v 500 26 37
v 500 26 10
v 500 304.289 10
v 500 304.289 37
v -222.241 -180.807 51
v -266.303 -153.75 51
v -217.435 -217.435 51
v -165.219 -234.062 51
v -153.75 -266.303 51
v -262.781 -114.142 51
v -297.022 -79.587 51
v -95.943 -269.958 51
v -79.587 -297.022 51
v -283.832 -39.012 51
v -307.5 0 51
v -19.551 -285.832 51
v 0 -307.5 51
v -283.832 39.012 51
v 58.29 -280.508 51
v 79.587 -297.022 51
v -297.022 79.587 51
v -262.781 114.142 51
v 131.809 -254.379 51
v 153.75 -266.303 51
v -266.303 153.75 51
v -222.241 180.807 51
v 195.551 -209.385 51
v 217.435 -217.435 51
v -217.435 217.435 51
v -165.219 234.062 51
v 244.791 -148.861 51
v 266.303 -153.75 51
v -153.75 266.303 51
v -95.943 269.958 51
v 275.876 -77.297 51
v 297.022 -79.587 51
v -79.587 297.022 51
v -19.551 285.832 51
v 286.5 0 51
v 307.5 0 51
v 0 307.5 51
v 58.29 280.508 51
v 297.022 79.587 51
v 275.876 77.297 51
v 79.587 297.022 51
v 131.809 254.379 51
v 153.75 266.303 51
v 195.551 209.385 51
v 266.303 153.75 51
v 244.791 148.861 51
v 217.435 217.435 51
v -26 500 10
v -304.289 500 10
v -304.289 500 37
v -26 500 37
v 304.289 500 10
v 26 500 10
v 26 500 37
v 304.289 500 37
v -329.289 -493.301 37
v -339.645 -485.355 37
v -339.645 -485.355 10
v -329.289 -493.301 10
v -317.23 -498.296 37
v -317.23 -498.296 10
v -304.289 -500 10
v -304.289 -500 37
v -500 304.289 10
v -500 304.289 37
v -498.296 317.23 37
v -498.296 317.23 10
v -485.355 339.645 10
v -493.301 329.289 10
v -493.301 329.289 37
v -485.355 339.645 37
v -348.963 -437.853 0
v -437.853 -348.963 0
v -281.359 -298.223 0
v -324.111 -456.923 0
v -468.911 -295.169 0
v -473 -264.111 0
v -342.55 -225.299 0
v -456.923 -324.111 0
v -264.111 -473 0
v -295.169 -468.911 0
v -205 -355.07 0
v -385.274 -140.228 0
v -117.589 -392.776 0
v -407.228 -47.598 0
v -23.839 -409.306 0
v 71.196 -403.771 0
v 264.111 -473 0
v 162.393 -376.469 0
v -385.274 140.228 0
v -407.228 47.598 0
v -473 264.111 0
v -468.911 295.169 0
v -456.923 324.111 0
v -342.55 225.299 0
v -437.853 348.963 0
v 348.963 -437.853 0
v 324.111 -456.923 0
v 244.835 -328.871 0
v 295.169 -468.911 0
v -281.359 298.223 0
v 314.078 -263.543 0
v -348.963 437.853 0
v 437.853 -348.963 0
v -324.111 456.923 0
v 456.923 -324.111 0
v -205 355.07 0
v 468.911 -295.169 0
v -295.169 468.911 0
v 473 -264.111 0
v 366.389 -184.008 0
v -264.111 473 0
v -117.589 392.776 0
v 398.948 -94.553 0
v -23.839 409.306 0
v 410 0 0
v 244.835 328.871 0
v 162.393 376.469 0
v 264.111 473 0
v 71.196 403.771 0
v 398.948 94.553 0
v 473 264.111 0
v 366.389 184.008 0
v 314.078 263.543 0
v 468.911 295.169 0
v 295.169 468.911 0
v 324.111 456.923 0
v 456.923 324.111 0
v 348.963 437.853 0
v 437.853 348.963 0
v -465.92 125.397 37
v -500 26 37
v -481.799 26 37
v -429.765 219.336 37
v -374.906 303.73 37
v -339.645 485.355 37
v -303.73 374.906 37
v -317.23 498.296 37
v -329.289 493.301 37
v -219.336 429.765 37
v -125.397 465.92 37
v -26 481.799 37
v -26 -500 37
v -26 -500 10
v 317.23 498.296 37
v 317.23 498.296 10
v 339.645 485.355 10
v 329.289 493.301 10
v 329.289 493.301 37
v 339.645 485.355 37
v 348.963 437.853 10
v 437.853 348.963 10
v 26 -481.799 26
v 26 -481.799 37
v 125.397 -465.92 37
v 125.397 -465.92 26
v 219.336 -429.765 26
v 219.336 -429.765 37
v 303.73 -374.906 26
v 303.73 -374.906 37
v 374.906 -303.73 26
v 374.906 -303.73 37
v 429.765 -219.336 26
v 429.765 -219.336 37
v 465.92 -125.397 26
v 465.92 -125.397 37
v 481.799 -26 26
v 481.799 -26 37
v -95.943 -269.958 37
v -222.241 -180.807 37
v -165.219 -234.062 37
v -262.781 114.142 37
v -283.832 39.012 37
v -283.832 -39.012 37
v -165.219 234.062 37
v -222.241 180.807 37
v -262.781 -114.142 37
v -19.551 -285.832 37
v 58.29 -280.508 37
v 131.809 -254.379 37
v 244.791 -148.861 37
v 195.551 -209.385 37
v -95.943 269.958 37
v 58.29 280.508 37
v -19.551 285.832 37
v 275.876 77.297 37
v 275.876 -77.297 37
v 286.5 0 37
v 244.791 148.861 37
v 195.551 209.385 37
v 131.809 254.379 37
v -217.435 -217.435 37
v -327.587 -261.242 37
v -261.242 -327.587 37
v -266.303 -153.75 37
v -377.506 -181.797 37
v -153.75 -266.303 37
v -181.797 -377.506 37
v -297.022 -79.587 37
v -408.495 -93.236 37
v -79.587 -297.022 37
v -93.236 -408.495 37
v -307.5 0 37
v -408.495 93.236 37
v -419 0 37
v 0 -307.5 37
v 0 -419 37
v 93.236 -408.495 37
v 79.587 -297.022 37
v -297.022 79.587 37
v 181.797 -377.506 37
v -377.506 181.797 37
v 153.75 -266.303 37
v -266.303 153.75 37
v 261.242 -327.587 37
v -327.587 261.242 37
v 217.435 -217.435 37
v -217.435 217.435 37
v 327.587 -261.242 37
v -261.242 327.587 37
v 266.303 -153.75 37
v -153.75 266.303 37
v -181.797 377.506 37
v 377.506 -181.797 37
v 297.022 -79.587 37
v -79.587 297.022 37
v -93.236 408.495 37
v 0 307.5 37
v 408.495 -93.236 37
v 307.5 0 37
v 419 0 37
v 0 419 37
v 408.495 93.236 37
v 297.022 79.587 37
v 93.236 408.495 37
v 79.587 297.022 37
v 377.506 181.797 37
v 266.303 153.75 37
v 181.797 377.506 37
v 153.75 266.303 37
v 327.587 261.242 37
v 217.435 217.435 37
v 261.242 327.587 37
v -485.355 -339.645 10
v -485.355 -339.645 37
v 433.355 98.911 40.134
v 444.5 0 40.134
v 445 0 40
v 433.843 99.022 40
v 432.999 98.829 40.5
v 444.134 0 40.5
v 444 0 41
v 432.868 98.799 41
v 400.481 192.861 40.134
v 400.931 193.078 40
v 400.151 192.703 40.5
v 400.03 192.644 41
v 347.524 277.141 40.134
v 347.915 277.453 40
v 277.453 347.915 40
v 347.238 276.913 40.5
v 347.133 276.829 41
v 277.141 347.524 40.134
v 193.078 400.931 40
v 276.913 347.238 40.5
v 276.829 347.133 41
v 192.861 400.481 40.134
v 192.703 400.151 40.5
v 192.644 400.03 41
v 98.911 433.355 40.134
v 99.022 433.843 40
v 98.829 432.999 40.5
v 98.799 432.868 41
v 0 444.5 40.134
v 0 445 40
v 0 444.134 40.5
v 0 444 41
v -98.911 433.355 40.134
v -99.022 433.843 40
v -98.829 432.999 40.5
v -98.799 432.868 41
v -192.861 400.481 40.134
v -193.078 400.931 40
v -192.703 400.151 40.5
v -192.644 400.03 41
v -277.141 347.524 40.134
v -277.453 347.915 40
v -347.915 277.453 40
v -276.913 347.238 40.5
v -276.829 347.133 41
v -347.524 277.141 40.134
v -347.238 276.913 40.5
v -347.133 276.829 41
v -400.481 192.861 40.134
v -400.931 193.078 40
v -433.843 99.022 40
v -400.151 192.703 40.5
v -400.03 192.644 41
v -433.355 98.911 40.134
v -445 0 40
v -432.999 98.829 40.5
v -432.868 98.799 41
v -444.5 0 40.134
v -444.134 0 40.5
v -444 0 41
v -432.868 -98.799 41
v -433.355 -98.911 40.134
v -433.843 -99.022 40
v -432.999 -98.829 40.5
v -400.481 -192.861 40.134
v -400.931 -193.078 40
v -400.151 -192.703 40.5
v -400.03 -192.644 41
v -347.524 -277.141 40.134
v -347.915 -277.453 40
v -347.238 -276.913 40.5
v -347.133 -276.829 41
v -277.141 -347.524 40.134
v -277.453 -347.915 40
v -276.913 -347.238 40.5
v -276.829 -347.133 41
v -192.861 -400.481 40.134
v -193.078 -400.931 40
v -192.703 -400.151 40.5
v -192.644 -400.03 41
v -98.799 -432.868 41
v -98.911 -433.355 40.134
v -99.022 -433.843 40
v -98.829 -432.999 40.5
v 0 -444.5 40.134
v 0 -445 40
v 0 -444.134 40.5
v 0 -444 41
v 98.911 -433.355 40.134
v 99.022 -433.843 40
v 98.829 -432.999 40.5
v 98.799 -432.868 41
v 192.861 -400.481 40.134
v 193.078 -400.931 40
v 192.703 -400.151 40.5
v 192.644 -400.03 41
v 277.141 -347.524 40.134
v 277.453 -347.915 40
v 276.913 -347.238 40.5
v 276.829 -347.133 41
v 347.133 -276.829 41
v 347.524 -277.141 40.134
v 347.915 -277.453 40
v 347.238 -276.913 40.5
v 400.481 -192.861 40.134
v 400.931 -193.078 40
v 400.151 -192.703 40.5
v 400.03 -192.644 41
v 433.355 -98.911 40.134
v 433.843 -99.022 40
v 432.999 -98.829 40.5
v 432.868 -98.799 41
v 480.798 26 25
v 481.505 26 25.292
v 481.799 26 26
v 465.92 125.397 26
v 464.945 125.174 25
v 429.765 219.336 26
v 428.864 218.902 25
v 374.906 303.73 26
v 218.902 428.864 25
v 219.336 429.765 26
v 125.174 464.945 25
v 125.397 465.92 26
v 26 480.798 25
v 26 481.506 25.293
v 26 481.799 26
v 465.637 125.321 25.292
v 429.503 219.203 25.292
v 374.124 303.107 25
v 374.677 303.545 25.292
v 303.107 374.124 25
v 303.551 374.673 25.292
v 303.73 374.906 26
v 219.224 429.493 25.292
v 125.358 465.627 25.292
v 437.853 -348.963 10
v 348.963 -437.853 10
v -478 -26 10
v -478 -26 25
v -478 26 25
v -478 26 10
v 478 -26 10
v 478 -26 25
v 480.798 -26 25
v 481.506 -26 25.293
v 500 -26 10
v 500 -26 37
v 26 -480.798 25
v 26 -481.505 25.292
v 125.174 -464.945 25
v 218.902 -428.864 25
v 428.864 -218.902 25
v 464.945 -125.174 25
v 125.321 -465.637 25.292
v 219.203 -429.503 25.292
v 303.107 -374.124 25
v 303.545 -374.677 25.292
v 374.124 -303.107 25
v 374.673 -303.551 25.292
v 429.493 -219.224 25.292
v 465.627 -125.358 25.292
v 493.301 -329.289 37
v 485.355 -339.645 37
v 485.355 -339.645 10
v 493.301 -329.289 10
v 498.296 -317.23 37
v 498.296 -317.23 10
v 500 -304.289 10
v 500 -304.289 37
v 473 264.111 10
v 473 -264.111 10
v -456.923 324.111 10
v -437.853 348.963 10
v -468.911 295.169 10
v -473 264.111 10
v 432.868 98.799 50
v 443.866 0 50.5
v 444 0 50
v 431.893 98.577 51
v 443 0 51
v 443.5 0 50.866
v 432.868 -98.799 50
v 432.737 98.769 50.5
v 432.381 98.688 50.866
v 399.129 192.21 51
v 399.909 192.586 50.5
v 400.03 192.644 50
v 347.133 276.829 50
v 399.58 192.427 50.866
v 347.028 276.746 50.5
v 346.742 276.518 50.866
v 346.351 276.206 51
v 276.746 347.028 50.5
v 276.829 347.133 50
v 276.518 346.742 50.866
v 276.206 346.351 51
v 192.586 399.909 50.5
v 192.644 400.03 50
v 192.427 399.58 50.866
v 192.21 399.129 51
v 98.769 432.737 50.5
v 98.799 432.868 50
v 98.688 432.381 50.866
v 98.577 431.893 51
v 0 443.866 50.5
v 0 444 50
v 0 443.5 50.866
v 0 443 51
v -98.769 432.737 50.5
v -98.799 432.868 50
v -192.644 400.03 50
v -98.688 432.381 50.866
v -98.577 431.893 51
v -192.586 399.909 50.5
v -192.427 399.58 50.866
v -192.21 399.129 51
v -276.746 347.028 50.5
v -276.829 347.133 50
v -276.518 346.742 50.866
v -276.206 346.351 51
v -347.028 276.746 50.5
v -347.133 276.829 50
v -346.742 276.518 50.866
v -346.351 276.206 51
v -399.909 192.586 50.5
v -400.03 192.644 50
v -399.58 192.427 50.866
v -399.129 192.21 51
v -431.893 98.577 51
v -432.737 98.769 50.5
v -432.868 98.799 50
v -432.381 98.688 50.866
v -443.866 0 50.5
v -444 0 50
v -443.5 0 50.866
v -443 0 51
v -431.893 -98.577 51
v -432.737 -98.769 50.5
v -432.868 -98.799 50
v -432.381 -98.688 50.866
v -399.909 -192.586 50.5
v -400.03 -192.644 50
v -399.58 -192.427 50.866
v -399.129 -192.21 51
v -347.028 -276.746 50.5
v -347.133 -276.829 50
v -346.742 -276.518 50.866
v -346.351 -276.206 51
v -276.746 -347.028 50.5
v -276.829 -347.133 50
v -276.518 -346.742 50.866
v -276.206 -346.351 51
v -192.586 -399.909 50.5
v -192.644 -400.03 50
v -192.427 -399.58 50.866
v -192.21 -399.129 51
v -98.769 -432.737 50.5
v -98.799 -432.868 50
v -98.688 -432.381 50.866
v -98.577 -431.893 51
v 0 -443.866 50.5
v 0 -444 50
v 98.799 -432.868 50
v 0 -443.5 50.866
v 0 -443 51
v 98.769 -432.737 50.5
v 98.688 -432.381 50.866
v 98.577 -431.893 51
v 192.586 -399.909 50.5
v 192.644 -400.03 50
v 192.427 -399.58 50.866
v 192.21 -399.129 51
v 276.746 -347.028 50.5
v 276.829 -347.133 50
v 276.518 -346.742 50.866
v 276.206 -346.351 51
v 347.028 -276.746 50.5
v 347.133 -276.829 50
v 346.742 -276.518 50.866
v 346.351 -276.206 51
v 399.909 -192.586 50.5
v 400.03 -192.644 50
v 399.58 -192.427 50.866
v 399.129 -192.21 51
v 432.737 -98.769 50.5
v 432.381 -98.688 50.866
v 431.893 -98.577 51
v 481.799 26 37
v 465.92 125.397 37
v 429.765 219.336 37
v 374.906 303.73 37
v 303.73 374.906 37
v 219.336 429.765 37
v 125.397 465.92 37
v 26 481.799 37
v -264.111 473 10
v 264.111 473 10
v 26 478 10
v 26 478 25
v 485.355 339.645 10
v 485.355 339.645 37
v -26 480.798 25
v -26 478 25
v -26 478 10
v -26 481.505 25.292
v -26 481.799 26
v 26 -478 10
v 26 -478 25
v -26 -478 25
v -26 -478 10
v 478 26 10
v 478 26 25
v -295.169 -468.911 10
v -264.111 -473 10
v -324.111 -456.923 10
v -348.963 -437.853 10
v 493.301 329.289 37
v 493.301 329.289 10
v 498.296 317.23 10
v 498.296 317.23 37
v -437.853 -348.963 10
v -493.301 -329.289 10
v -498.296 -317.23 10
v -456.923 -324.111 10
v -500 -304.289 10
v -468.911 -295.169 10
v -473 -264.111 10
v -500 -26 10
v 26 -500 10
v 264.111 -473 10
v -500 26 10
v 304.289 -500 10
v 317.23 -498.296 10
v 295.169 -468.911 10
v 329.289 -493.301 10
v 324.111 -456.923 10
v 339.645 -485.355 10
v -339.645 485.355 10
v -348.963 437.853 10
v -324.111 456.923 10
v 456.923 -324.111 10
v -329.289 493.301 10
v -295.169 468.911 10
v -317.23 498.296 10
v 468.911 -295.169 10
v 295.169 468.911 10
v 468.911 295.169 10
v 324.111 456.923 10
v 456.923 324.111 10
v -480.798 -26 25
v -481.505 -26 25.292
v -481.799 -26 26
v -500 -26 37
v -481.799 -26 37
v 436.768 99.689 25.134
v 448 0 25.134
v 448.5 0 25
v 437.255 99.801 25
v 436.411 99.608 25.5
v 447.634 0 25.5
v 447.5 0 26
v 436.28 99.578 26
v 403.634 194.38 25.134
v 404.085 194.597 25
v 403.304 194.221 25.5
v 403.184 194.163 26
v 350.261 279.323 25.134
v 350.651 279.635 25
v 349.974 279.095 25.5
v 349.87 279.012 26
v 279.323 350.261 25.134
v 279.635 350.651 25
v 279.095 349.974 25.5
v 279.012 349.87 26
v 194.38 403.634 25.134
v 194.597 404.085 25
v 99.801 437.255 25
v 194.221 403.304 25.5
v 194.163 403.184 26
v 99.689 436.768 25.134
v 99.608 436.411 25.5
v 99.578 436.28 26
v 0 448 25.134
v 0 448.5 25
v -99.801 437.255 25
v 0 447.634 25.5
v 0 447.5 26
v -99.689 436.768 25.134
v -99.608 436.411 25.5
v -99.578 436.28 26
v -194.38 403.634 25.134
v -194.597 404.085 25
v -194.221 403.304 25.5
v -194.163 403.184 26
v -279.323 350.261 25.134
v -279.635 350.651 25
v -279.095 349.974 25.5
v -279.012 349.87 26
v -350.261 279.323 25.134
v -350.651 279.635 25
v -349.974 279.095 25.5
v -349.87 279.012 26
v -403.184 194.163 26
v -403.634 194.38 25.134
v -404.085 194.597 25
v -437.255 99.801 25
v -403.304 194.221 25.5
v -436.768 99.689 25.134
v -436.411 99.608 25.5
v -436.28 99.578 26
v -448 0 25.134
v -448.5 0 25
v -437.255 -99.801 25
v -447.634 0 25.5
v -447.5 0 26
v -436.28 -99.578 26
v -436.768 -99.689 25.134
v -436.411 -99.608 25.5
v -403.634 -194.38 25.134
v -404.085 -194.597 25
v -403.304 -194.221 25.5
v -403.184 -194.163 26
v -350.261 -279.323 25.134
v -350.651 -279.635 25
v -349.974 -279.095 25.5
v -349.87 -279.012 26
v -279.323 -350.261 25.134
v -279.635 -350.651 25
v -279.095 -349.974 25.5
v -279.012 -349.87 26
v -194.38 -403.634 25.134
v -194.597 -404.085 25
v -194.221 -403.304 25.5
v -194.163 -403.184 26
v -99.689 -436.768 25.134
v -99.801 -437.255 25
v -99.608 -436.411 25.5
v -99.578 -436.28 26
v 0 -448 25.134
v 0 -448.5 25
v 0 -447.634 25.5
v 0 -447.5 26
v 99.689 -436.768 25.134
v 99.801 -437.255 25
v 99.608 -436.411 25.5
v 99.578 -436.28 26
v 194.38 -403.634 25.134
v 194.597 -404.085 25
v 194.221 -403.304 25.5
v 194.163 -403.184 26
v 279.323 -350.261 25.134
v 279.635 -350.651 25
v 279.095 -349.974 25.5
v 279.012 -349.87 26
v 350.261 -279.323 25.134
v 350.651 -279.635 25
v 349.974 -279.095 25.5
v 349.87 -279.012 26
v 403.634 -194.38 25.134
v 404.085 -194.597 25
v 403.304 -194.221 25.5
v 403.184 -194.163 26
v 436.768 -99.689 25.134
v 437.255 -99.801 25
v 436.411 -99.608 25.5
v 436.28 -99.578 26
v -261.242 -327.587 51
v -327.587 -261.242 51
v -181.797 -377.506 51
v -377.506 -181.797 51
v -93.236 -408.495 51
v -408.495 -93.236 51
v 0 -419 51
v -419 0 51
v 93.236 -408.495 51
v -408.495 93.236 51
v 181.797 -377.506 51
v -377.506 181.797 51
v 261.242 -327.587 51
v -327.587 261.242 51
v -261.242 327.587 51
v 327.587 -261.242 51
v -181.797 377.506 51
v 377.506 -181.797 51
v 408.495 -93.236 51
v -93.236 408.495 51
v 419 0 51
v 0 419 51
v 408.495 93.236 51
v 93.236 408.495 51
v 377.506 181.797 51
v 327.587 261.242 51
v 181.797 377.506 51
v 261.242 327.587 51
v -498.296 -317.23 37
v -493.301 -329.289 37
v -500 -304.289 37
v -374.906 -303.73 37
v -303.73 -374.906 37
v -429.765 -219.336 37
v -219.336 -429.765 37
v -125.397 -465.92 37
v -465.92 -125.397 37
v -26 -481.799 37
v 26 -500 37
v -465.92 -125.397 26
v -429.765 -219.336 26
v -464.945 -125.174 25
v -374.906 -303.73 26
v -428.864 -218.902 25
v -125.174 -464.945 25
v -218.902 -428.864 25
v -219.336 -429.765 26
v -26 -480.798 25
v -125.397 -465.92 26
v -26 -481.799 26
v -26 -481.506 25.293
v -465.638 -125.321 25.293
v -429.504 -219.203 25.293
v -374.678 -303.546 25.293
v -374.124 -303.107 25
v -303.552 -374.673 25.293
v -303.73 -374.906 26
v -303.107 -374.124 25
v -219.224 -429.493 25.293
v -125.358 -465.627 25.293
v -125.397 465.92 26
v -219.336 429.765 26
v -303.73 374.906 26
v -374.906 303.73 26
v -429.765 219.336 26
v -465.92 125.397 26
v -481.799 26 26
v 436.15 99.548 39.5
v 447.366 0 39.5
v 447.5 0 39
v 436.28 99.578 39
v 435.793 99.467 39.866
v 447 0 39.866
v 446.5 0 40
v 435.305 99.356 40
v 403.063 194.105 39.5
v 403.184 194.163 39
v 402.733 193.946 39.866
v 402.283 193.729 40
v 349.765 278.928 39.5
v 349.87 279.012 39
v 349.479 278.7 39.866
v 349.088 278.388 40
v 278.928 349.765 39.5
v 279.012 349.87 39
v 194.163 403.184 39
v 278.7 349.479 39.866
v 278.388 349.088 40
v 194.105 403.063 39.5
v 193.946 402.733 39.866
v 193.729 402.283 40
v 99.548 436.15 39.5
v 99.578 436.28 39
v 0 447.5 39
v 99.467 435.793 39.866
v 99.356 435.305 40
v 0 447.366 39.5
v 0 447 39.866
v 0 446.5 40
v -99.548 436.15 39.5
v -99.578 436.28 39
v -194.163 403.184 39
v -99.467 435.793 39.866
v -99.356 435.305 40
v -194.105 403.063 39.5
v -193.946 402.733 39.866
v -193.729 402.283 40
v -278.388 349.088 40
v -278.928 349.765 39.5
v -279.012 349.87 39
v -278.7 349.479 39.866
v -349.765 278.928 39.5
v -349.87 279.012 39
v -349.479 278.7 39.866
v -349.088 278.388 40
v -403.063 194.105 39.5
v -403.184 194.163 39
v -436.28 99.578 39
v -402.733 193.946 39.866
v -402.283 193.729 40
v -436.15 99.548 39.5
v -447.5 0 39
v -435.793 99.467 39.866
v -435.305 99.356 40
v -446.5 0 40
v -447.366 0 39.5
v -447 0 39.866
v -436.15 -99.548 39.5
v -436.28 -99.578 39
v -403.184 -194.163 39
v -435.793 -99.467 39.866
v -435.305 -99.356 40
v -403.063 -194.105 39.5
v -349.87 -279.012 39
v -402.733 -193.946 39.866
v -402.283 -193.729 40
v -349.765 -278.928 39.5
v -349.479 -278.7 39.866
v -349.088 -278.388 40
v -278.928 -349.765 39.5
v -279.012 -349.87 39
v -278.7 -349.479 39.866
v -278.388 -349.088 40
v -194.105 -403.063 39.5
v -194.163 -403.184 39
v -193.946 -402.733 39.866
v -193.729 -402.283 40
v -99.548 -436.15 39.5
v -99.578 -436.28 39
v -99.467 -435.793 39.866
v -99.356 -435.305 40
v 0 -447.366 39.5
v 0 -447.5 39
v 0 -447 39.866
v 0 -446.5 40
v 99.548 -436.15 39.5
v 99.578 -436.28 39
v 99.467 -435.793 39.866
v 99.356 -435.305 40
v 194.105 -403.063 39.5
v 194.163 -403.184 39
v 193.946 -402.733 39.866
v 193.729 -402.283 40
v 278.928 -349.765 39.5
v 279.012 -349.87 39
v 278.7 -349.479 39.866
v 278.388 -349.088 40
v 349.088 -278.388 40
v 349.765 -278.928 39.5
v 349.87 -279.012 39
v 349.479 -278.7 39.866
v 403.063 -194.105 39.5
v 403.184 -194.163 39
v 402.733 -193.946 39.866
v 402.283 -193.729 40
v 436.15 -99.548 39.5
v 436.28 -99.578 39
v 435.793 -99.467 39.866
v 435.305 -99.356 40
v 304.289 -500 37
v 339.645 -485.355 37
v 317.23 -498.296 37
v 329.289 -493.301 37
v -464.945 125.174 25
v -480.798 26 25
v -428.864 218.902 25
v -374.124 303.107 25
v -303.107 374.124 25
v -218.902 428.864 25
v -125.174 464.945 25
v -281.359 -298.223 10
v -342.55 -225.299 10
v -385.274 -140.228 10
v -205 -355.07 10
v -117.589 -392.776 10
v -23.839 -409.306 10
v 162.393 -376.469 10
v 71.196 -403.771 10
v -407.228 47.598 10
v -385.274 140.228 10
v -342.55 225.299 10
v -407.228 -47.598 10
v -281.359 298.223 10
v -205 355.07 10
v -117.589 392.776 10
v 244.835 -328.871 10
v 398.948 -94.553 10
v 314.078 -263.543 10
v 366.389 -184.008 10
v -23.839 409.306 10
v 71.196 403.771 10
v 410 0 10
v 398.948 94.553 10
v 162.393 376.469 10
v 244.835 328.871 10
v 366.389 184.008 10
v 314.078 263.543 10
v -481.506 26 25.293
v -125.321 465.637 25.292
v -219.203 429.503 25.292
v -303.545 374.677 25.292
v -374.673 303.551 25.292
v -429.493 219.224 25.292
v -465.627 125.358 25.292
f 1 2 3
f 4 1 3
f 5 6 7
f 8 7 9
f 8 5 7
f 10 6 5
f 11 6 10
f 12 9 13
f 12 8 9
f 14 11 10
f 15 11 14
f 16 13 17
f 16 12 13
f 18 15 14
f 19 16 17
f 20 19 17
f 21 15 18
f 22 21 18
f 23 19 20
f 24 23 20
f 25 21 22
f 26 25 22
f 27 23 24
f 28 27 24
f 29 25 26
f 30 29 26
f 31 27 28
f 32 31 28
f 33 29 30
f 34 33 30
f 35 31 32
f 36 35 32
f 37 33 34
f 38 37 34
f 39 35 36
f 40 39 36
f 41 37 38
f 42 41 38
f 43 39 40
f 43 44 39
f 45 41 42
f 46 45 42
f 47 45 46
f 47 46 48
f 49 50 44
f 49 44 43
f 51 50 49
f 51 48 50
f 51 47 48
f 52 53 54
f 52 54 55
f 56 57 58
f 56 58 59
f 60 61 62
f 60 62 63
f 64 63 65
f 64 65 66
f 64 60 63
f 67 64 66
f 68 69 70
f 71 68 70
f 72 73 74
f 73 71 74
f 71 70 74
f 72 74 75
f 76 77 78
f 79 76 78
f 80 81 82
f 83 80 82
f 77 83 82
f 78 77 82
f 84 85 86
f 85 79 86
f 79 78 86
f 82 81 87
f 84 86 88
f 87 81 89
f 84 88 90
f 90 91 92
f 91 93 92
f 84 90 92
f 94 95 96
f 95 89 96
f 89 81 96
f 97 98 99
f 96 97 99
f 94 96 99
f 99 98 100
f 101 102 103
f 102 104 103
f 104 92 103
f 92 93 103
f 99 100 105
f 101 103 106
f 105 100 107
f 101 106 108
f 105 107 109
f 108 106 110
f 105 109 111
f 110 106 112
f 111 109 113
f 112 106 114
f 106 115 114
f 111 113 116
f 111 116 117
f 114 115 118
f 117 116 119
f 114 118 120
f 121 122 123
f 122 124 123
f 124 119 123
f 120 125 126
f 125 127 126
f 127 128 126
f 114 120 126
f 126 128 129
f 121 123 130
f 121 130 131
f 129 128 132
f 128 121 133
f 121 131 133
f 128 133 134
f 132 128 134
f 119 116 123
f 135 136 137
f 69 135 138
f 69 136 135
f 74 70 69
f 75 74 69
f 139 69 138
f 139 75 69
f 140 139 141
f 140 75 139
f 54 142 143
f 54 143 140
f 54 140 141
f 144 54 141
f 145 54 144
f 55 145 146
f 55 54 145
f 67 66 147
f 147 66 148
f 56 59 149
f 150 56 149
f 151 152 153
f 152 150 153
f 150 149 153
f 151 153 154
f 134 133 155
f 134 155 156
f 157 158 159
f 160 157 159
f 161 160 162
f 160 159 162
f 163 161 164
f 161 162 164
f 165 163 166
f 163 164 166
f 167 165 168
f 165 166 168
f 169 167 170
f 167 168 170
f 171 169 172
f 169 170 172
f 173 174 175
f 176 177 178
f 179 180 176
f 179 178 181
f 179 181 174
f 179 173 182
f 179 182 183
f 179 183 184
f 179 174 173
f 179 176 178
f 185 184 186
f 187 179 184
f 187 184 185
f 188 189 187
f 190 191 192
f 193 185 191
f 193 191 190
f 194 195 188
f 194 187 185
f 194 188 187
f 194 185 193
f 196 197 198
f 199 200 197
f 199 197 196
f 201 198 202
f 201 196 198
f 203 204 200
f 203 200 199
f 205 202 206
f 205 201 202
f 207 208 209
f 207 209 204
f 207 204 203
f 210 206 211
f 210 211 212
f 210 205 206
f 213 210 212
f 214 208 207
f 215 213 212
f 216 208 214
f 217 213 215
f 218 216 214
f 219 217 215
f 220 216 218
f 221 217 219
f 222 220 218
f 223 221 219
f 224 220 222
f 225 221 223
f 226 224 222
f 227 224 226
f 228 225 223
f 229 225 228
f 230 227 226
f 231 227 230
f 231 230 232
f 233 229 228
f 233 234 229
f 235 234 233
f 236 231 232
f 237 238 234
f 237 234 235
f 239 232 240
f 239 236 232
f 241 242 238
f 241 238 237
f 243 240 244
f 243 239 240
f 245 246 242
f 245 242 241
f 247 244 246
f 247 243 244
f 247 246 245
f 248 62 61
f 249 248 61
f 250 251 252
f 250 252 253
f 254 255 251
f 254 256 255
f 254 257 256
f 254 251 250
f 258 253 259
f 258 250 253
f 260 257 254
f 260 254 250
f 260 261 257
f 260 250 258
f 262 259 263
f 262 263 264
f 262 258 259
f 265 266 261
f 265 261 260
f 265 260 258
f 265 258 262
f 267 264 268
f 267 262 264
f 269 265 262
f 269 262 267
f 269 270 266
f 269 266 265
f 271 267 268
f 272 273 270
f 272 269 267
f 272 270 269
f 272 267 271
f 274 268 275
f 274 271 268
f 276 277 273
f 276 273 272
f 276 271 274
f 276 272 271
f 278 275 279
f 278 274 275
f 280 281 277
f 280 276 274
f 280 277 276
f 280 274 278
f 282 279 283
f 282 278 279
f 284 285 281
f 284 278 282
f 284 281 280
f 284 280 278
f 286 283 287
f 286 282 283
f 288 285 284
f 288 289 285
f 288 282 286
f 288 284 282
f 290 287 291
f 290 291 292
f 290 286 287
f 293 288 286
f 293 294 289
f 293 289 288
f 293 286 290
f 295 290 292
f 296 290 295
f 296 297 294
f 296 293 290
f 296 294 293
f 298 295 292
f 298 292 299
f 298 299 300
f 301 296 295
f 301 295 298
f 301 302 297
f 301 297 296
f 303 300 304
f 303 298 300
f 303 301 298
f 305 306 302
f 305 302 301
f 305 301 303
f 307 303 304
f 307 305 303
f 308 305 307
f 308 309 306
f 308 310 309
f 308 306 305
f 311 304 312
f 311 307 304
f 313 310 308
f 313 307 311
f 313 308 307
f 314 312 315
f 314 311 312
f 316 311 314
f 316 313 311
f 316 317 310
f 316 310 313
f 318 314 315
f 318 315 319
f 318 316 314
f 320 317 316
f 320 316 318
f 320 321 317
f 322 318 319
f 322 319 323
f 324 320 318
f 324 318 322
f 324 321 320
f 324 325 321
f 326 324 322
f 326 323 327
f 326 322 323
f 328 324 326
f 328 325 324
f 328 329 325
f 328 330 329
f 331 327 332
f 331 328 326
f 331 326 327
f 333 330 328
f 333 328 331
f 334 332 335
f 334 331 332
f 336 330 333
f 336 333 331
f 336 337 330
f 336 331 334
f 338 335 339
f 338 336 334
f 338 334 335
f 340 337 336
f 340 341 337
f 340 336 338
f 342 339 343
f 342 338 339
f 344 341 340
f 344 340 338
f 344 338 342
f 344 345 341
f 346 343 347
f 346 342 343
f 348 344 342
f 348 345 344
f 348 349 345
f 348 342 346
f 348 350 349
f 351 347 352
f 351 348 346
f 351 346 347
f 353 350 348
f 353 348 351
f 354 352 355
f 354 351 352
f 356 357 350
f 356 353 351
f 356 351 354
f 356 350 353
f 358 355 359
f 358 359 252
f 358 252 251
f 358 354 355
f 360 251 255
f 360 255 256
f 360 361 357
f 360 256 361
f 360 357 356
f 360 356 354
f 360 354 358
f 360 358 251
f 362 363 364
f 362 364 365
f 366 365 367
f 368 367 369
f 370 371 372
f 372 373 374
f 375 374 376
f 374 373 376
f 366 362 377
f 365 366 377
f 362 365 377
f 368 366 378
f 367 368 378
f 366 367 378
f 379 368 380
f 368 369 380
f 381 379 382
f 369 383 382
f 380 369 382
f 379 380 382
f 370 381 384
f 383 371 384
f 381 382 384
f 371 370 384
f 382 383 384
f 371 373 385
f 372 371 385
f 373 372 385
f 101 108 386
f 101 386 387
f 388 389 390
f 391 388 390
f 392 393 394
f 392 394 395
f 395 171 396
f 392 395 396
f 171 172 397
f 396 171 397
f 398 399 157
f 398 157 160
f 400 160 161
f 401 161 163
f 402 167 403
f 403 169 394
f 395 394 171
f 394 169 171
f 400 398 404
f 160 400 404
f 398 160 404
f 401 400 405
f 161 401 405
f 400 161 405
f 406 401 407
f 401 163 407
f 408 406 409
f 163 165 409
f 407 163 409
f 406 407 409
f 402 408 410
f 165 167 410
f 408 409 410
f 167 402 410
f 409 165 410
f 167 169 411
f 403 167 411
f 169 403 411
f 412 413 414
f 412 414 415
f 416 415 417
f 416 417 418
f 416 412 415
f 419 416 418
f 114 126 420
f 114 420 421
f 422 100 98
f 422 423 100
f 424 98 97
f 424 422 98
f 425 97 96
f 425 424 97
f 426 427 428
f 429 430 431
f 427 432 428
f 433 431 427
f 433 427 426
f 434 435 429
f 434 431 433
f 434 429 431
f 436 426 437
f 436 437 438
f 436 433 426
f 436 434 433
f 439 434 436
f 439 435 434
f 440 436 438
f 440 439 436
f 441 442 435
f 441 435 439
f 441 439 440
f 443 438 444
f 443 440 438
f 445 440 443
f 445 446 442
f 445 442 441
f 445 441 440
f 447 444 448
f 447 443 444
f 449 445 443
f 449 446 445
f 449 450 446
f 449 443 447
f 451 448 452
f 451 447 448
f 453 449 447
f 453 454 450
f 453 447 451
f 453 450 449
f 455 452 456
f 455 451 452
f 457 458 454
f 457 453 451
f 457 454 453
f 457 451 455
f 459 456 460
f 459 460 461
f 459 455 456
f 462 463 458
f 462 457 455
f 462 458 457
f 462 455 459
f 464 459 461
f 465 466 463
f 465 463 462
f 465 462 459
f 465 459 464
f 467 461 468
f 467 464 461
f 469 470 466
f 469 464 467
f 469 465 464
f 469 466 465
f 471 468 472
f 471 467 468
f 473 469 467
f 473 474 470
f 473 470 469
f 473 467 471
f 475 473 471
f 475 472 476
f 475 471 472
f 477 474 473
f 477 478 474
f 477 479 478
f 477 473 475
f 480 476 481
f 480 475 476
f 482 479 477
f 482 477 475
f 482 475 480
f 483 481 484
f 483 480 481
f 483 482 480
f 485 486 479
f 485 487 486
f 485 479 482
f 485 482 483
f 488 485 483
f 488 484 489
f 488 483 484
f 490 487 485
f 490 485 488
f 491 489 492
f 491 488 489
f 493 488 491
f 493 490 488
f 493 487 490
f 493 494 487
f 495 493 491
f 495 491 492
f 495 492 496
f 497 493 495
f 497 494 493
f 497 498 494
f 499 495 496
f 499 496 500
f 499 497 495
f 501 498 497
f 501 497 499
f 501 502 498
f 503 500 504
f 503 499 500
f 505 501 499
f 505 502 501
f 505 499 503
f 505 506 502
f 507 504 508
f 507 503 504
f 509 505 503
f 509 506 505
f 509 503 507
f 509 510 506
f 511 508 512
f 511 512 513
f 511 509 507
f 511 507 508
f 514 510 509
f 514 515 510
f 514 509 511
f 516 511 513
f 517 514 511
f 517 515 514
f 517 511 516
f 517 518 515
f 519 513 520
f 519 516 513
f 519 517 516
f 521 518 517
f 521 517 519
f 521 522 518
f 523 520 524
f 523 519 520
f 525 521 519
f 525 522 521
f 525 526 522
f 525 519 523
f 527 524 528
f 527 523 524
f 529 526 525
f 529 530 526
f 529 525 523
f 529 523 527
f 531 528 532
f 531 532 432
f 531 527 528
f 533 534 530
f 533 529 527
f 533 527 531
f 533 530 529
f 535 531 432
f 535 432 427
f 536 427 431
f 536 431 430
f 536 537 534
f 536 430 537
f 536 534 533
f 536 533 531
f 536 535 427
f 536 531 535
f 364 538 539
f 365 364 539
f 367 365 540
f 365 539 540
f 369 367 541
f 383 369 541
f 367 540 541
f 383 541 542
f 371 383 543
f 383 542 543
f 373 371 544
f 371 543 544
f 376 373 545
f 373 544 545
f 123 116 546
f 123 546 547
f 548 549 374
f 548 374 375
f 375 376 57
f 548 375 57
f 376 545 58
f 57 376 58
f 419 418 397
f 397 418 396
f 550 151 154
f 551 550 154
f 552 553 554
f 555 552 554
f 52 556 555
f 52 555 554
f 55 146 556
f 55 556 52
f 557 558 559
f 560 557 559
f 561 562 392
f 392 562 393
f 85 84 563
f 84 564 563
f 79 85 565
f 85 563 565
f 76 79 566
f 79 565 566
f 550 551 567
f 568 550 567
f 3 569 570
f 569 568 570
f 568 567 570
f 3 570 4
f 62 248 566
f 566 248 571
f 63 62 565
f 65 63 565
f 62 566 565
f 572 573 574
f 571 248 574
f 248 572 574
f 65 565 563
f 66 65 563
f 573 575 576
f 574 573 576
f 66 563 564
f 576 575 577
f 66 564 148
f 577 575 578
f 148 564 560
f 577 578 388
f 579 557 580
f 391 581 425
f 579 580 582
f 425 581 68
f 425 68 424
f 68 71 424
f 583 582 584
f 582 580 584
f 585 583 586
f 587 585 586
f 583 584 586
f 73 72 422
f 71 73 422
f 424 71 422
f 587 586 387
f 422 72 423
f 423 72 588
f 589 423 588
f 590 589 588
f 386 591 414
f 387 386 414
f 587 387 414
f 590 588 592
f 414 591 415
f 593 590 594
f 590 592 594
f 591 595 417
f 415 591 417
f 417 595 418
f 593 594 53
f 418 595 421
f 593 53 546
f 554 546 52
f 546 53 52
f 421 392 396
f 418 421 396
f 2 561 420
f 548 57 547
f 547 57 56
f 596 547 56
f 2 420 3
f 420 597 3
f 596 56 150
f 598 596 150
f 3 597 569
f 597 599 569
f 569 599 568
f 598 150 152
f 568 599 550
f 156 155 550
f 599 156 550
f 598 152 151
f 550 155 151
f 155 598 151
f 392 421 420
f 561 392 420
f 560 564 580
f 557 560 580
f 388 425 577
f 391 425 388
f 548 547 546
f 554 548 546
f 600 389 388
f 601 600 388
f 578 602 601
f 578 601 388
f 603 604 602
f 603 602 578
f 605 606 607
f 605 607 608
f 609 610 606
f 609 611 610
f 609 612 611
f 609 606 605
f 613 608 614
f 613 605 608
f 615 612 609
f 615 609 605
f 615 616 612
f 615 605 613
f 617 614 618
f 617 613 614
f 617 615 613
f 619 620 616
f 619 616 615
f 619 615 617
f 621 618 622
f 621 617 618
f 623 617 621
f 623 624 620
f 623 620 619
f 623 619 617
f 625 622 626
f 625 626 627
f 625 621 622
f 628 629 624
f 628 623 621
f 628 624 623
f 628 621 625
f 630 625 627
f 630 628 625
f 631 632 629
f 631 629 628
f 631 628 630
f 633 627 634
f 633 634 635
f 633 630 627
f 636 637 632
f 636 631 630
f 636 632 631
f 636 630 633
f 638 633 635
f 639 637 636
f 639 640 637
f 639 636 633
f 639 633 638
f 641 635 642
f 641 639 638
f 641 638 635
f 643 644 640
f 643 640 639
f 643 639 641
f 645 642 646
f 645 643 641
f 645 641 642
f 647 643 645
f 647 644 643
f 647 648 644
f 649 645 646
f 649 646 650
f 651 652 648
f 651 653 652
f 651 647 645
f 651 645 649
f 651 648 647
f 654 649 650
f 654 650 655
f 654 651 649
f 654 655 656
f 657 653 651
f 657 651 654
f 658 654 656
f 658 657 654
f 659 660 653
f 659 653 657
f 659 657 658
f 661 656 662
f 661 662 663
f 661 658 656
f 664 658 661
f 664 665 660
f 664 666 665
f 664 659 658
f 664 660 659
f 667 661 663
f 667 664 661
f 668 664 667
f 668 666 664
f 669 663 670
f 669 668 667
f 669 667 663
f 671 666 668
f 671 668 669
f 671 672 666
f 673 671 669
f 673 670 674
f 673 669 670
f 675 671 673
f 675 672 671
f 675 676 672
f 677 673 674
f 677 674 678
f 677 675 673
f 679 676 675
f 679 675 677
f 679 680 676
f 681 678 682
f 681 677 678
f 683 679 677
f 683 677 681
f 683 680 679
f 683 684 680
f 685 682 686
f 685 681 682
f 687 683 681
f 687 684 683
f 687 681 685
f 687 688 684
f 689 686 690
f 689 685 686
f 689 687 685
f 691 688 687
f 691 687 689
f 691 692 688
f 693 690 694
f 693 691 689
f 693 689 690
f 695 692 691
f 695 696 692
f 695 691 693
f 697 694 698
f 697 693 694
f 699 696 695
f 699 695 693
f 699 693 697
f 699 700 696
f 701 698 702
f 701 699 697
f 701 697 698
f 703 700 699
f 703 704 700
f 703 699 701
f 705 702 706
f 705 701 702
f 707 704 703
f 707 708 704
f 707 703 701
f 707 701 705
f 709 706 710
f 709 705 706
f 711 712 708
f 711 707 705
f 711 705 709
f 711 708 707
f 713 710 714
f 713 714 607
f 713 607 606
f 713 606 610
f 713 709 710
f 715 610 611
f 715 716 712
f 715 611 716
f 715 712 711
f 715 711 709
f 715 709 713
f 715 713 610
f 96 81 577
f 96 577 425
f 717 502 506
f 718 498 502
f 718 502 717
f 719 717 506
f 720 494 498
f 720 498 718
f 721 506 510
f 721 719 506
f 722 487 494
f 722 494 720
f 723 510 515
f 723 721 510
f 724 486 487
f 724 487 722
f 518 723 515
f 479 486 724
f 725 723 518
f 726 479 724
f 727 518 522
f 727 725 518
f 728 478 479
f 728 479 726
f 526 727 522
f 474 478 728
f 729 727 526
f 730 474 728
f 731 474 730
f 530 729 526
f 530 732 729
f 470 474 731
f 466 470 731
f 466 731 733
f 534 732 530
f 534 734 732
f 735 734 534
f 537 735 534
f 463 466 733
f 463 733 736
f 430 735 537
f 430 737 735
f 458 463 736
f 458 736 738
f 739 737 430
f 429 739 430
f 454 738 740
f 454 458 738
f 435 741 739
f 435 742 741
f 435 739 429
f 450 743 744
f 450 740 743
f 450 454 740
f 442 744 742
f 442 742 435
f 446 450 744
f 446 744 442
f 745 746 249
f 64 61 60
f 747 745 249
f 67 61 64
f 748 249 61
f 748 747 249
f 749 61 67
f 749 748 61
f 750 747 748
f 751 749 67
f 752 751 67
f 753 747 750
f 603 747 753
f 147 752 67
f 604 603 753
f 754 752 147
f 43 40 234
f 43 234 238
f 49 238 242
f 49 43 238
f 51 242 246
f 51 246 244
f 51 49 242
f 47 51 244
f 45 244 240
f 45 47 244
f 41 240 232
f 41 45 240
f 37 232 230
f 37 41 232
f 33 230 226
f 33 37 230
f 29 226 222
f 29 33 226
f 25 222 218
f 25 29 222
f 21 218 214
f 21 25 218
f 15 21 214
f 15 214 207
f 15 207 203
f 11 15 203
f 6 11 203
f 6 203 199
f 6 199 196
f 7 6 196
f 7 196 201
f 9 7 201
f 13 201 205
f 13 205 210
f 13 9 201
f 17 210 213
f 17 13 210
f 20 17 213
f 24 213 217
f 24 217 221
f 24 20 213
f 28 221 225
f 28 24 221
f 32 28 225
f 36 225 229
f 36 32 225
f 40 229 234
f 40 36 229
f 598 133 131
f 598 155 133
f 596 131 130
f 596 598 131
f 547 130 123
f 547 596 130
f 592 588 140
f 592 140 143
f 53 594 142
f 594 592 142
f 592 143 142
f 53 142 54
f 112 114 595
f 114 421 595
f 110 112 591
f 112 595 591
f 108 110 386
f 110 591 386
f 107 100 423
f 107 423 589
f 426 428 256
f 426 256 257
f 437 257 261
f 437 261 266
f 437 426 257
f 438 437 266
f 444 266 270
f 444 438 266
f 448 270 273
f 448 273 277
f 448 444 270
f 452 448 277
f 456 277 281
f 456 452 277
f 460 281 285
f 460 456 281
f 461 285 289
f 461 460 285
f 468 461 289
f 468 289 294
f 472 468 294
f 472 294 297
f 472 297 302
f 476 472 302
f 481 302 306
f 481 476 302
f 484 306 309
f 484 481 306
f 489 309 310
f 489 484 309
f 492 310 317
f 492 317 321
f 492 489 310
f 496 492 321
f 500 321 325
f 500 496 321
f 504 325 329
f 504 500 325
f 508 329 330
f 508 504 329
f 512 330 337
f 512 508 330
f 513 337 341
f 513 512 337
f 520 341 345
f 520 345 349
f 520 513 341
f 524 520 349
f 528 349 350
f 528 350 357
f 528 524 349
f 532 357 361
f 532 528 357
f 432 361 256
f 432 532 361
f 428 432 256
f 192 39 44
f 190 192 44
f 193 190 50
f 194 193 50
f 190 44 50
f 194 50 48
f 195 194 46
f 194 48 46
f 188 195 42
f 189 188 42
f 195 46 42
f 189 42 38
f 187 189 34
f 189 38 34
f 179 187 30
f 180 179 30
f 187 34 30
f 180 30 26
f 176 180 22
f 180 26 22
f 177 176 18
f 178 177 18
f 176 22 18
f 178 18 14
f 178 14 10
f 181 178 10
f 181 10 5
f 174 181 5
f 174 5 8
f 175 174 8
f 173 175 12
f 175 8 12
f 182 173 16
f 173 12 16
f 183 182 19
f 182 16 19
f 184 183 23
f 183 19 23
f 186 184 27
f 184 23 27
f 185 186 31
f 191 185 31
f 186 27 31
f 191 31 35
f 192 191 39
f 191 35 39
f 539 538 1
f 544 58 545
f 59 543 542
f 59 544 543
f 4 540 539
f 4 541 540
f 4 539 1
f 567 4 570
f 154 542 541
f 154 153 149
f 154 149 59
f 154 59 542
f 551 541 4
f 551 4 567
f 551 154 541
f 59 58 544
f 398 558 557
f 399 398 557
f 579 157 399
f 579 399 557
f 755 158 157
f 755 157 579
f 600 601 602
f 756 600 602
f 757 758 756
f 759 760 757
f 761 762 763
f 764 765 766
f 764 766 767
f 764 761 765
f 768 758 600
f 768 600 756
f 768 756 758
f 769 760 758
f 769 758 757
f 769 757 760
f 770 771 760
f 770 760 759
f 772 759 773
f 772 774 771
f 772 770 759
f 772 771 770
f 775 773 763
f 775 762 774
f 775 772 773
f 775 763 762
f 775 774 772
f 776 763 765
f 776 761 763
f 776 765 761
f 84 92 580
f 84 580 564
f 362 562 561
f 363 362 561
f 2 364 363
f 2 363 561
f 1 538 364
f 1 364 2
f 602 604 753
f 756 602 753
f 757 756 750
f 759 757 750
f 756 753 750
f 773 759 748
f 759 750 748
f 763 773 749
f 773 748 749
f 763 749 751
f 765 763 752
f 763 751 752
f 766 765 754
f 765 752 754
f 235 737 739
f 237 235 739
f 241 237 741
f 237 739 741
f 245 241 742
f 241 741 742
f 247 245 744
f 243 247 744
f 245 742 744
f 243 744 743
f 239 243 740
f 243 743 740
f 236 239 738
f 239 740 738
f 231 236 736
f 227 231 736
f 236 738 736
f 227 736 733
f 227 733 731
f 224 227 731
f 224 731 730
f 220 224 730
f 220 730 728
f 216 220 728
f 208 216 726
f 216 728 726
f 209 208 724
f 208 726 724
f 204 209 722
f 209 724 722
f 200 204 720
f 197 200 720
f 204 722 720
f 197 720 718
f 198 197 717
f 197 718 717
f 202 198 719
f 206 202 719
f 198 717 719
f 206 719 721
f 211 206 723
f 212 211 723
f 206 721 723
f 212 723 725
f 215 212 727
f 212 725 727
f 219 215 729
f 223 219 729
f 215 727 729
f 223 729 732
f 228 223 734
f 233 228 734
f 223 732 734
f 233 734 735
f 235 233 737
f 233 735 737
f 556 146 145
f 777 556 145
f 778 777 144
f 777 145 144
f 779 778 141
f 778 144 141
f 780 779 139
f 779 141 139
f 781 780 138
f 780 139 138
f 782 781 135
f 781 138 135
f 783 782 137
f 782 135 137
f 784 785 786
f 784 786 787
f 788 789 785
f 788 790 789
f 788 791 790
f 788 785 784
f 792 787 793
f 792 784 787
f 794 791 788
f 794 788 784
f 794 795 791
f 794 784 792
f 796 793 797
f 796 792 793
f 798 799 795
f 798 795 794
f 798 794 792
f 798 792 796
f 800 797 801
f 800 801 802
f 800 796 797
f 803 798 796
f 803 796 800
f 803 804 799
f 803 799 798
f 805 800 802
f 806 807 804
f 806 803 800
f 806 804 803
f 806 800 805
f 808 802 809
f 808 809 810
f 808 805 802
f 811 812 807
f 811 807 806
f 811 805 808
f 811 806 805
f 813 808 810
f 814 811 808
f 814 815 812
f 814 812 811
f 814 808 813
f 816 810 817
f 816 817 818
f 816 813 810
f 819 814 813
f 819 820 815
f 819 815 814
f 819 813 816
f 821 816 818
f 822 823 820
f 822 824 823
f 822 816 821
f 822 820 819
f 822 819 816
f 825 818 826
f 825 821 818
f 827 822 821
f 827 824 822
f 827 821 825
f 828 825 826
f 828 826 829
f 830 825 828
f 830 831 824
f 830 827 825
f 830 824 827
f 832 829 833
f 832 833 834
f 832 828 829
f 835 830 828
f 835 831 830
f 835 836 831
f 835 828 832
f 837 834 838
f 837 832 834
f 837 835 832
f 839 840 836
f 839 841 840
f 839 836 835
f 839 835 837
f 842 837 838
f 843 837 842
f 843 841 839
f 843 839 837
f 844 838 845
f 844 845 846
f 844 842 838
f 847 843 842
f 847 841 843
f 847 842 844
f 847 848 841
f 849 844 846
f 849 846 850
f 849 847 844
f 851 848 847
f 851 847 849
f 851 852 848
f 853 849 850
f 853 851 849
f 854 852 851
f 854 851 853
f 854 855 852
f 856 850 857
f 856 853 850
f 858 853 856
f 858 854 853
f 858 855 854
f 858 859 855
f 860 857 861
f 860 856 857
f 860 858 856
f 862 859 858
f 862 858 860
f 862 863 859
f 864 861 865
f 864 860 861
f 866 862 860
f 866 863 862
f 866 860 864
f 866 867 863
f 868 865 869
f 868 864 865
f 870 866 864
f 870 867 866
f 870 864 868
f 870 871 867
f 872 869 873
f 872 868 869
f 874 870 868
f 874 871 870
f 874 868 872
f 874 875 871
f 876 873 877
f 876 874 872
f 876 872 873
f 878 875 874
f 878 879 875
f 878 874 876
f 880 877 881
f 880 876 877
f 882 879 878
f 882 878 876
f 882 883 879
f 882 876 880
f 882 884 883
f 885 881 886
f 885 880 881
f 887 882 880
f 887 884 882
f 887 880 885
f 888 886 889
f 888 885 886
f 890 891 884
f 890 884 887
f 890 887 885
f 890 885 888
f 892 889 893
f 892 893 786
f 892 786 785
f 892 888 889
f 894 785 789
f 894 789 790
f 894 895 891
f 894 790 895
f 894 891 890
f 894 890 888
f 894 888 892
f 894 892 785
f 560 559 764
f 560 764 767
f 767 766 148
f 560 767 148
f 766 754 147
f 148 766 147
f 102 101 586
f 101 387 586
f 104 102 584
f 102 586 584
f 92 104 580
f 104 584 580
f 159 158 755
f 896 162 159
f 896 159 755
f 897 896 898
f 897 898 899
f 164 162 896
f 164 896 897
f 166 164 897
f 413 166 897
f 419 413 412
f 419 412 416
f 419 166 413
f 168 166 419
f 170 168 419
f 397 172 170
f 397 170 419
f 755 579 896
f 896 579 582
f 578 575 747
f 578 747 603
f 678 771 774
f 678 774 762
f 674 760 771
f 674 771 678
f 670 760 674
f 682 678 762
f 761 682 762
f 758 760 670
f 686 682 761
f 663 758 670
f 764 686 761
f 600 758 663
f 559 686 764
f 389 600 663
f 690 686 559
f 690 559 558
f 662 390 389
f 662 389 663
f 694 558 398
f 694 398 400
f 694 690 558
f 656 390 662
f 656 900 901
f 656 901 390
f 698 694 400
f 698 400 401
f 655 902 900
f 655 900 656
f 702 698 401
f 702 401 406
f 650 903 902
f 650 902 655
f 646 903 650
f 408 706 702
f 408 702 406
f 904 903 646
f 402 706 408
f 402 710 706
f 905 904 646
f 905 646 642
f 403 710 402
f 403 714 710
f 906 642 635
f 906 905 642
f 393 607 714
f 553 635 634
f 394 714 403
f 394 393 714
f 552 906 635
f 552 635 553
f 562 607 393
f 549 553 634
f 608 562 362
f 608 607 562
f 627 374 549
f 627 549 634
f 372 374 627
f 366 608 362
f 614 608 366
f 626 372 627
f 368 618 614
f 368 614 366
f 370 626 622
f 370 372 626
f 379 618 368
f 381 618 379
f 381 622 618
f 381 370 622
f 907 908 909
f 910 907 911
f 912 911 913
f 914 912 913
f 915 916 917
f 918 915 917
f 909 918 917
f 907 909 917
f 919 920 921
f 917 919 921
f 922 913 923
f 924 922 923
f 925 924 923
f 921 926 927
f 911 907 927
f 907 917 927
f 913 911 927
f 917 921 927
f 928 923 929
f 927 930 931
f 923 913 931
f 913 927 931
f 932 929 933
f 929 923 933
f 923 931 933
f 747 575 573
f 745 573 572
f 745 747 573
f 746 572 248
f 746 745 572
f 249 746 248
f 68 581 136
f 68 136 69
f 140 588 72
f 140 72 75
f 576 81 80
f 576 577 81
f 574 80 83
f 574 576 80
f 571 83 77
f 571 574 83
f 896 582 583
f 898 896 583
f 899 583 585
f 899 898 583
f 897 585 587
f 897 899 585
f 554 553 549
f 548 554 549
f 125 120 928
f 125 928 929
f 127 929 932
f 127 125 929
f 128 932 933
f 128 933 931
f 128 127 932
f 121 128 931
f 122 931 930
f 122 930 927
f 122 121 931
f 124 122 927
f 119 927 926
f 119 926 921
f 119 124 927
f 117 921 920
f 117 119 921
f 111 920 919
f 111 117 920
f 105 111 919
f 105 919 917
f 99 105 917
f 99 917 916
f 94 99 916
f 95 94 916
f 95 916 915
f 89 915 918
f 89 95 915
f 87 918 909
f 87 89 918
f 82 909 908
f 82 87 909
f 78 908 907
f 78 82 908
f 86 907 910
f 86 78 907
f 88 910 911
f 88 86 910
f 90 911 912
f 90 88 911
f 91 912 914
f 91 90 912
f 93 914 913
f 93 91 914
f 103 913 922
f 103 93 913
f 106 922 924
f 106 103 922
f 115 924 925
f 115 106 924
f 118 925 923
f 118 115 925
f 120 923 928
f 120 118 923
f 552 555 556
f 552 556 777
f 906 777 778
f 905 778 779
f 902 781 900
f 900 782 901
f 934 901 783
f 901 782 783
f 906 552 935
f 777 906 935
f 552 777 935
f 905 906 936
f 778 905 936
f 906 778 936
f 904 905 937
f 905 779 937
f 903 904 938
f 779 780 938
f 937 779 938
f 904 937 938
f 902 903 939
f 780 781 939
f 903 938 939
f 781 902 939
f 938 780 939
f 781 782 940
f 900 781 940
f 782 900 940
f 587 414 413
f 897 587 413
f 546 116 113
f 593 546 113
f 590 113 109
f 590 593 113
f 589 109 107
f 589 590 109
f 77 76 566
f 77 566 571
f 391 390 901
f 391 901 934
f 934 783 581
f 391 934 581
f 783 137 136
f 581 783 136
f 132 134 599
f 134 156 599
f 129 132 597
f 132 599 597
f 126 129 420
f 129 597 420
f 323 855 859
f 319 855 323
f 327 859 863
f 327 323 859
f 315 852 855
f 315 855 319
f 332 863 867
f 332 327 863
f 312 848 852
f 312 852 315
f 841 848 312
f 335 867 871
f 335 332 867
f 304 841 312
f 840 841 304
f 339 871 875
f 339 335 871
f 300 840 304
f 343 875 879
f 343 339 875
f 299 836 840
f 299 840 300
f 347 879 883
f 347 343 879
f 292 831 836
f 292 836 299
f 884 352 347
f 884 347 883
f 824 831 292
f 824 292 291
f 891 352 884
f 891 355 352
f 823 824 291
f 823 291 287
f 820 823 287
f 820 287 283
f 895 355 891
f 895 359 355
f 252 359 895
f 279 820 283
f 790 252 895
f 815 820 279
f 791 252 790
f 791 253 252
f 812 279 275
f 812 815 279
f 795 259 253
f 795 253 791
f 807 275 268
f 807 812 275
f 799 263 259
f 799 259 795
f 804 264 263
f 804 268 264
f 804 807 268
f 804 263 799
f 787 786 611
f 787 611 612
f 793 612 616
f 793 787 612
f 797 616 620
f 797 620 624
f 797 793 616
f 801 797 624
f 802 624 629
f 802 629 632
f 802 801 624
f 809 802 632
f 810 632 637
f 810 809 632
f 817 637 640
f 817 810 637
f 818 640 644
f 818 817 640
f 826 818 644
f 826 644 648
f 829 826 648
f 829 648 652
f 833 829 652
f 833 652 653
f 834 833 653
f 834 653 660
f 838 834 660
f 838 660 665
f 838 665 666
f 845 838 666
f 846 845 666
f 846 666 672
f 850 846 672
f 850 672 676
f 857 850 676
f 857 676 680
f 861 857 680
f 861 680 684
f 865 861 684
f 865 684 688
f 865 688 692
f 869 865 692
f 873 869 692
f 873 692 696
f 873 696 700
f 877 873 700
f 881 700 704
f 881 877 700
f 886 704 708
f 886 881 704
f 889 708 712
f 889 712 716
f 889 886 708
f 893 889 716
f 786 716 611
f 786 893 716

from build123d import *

# Parameters (mm, degrees)
F0_W            = 1000
F0_H            = 1000
F1_DEPTH        = 51
F2_SIZE         = 175
F3_R            = 50
F5_W            = 52
F5_H            = 100
F6_DEPTH        = 100
F6_COPIES_COUNT = 4
F7_R            = 410
F8_DEPTH        = 10
F9_W            = 1332.0814967155
F9_H            = 1389.9142146111
F10_DEPTH       = 10
F11_R           = 120
F12_R           = 700
F12_R_2         = 444
F13_DEPTH       = 11
F14_R           = 700
F14_R_2         = 447.5
F15_DEPTH       = 14
F16_R           = 482.5
F16_R_2         = 447.5
F17_DEPTH       = 26
F18_R           = 1
F19_R           = 419
F19_R_2         = 307.5
F20_DEPTH       = 14
F21_R           = 286.5
F22_DEPTH       = 14


# Not quite as in the source:
# - a pattern or mirror of a feature is missing from the dataset's text; its kind, count and spacing are read off the source's solid


with BuildPart() as f1:
    # F0 (on Top) → F1 (new body)
    with BuildSketch(Plane.XY):
        Rectangle(F0_W, F0_H)
    extrude(amount=F1_DEPTH)

    # F2
    f2_edges = [f1.edges().sort_by_distance(p)[0] for p in [
        (-500, -500, 25.5),
        (500, -500, 25.5),
        (500, 500, 25.5),
        (-500, 500, 25.5),
    ]]
    chamfer(f2_edges, length=F2_SIZE)

    # F3
    f3_edges = [f1.edges().sort_by_distance(p)[0] for p in [
        (-500, -325, 25.5),
        (-325, -500, 25.5),
        (325, -500, 25.5),
        (500, -325, 25.5),
        (-500, 325, 25.5),
        (500, 325, 25.5),
        (325, 500, 25.5),
        (-325, 500, 25.5),
    ]]
    fillet(f3_edges, radius=F3_R)

    # F5 (on face) → F6 (cut)
    with BuildSketch(Plane.XY.offset(51)):
        with Locations((0, 528)):
            Rectangle(F5_W, F5_H)
    f6 = extrude(amount=-F6_DEPTH, mode=Mode.SUBTRACT)

    # F6_copies: F6 ×4 about axis
    f6_copies_axis = Axis((0, 0, 0), (0, 0, 1))
    for i in range(1, F6_COPIES_COUNT):
        add(f6.rotate(f6_copies_axis, i * 360 / F6_COPIES_COUNT), mode=Mode.SUBTRACT)

    # F7 (on Top) → F8 (cut)
    with BuildSketch(Plane.XY):
        Circle(F7_R)
    extrude(amount=F8_DEPTH, mode=Mode.SUBTRACT)

    # F9 (on Top) → F10 (cut)
    with BuildSketch(Plane.XY):
        with Locations((-30.3454697132, 79.7554552555)):
            Rectangle(F9_W, F9_H)
        Polygon((473, 313.8162338159), (473, -313.8162338159), (313.8162338159, -473), (-313.8162338159, -473), (-473, -313.8162338159), (-473, 313.8162338159), (-313.8162338159, 473), (313.8162338159, 473), align=None, mode=Mode.SUBTRACT)
    extrude(amount=F10_DEPTH, mode=Mode.SUBTRACT)

    # F11
    f11_edges = [f1.edges().sort_by_distance(p)[0] for p in [
        (-313.816234, -473, 5),
        (-473, -313.816234, 5),
        (-473, 313.816234, 5),
        (-313.816234, 473, 5),
        (473, -313.816234, 5),
        (313.816234, -473, 5),
        (313.816234, 473, 5),
        (473, 313.816234, 5),
    ]]
    fillet(f11_edges, radius=F11_R)

    # F12 (on face) → F13 (cut)
    with BuildSketch(Plane.XY.offset(51)):
        Circle(F12_R)
        Circle(F12_R_2, mode=Mode.SUBTRACT)
    extrude(amount=-F13_DEPTH, mode=Mode.SUBTRACT)

    # F14 (on face) → F15 (cut)
    with BuildSketch(Plane.XY.offset(51)):
        Circle(F14_R)
        Circle(F14_R_2, mode=Mode.SUBTRACT)
    extrude(amount=-F15_DEPTH, mode=Mode.SUBTRACT)

    # F16 (on face) → F17 (cut)
    with BuildSketch(Plane.XY.offset(51)):
        Circle(F16_R)
        Circle(F16_R_2, mode=Mode.SUBTRACT)
    extrude(amount=-F17_DEPTH, mode=Mode.SUBTRACT)

    # F18
    f18_edges = [f1.edges().sort_by_distance(p)[0] for p in [
        (-341.179022, 341.179022, 25),
        (341.179022, 341.179022, 25),
        (341.179022, -341.179022, 25),
        (-341.179022, -341.179022, 25),
        (-447.5, 0, 25),
        (-444, 0, 40),
        (-447.5, 0, 40),
        (-444, 0, 51),
    ]]
    fillet(f18_edges, radius=F18_R)

    # F19 (on face) → F20 (cut)
    with BuildSketch(Plane.XY.offset(51)):
        Circle(F19_R)
        Circle(F19_R_2, mode=Mode.SUBTRACT)
    extrude(amount=-F20_DEPTH, mode=Mode.SUBTRACT)

    # F21 (on face) → F22 (cut)
    with BuildSketch(Plane.XY.offset(51)):
        Circle(F21_R)
    extrude(amount=-F22_DEPTH, mode=Mode.SUBTRACT)


solid = f1.part
